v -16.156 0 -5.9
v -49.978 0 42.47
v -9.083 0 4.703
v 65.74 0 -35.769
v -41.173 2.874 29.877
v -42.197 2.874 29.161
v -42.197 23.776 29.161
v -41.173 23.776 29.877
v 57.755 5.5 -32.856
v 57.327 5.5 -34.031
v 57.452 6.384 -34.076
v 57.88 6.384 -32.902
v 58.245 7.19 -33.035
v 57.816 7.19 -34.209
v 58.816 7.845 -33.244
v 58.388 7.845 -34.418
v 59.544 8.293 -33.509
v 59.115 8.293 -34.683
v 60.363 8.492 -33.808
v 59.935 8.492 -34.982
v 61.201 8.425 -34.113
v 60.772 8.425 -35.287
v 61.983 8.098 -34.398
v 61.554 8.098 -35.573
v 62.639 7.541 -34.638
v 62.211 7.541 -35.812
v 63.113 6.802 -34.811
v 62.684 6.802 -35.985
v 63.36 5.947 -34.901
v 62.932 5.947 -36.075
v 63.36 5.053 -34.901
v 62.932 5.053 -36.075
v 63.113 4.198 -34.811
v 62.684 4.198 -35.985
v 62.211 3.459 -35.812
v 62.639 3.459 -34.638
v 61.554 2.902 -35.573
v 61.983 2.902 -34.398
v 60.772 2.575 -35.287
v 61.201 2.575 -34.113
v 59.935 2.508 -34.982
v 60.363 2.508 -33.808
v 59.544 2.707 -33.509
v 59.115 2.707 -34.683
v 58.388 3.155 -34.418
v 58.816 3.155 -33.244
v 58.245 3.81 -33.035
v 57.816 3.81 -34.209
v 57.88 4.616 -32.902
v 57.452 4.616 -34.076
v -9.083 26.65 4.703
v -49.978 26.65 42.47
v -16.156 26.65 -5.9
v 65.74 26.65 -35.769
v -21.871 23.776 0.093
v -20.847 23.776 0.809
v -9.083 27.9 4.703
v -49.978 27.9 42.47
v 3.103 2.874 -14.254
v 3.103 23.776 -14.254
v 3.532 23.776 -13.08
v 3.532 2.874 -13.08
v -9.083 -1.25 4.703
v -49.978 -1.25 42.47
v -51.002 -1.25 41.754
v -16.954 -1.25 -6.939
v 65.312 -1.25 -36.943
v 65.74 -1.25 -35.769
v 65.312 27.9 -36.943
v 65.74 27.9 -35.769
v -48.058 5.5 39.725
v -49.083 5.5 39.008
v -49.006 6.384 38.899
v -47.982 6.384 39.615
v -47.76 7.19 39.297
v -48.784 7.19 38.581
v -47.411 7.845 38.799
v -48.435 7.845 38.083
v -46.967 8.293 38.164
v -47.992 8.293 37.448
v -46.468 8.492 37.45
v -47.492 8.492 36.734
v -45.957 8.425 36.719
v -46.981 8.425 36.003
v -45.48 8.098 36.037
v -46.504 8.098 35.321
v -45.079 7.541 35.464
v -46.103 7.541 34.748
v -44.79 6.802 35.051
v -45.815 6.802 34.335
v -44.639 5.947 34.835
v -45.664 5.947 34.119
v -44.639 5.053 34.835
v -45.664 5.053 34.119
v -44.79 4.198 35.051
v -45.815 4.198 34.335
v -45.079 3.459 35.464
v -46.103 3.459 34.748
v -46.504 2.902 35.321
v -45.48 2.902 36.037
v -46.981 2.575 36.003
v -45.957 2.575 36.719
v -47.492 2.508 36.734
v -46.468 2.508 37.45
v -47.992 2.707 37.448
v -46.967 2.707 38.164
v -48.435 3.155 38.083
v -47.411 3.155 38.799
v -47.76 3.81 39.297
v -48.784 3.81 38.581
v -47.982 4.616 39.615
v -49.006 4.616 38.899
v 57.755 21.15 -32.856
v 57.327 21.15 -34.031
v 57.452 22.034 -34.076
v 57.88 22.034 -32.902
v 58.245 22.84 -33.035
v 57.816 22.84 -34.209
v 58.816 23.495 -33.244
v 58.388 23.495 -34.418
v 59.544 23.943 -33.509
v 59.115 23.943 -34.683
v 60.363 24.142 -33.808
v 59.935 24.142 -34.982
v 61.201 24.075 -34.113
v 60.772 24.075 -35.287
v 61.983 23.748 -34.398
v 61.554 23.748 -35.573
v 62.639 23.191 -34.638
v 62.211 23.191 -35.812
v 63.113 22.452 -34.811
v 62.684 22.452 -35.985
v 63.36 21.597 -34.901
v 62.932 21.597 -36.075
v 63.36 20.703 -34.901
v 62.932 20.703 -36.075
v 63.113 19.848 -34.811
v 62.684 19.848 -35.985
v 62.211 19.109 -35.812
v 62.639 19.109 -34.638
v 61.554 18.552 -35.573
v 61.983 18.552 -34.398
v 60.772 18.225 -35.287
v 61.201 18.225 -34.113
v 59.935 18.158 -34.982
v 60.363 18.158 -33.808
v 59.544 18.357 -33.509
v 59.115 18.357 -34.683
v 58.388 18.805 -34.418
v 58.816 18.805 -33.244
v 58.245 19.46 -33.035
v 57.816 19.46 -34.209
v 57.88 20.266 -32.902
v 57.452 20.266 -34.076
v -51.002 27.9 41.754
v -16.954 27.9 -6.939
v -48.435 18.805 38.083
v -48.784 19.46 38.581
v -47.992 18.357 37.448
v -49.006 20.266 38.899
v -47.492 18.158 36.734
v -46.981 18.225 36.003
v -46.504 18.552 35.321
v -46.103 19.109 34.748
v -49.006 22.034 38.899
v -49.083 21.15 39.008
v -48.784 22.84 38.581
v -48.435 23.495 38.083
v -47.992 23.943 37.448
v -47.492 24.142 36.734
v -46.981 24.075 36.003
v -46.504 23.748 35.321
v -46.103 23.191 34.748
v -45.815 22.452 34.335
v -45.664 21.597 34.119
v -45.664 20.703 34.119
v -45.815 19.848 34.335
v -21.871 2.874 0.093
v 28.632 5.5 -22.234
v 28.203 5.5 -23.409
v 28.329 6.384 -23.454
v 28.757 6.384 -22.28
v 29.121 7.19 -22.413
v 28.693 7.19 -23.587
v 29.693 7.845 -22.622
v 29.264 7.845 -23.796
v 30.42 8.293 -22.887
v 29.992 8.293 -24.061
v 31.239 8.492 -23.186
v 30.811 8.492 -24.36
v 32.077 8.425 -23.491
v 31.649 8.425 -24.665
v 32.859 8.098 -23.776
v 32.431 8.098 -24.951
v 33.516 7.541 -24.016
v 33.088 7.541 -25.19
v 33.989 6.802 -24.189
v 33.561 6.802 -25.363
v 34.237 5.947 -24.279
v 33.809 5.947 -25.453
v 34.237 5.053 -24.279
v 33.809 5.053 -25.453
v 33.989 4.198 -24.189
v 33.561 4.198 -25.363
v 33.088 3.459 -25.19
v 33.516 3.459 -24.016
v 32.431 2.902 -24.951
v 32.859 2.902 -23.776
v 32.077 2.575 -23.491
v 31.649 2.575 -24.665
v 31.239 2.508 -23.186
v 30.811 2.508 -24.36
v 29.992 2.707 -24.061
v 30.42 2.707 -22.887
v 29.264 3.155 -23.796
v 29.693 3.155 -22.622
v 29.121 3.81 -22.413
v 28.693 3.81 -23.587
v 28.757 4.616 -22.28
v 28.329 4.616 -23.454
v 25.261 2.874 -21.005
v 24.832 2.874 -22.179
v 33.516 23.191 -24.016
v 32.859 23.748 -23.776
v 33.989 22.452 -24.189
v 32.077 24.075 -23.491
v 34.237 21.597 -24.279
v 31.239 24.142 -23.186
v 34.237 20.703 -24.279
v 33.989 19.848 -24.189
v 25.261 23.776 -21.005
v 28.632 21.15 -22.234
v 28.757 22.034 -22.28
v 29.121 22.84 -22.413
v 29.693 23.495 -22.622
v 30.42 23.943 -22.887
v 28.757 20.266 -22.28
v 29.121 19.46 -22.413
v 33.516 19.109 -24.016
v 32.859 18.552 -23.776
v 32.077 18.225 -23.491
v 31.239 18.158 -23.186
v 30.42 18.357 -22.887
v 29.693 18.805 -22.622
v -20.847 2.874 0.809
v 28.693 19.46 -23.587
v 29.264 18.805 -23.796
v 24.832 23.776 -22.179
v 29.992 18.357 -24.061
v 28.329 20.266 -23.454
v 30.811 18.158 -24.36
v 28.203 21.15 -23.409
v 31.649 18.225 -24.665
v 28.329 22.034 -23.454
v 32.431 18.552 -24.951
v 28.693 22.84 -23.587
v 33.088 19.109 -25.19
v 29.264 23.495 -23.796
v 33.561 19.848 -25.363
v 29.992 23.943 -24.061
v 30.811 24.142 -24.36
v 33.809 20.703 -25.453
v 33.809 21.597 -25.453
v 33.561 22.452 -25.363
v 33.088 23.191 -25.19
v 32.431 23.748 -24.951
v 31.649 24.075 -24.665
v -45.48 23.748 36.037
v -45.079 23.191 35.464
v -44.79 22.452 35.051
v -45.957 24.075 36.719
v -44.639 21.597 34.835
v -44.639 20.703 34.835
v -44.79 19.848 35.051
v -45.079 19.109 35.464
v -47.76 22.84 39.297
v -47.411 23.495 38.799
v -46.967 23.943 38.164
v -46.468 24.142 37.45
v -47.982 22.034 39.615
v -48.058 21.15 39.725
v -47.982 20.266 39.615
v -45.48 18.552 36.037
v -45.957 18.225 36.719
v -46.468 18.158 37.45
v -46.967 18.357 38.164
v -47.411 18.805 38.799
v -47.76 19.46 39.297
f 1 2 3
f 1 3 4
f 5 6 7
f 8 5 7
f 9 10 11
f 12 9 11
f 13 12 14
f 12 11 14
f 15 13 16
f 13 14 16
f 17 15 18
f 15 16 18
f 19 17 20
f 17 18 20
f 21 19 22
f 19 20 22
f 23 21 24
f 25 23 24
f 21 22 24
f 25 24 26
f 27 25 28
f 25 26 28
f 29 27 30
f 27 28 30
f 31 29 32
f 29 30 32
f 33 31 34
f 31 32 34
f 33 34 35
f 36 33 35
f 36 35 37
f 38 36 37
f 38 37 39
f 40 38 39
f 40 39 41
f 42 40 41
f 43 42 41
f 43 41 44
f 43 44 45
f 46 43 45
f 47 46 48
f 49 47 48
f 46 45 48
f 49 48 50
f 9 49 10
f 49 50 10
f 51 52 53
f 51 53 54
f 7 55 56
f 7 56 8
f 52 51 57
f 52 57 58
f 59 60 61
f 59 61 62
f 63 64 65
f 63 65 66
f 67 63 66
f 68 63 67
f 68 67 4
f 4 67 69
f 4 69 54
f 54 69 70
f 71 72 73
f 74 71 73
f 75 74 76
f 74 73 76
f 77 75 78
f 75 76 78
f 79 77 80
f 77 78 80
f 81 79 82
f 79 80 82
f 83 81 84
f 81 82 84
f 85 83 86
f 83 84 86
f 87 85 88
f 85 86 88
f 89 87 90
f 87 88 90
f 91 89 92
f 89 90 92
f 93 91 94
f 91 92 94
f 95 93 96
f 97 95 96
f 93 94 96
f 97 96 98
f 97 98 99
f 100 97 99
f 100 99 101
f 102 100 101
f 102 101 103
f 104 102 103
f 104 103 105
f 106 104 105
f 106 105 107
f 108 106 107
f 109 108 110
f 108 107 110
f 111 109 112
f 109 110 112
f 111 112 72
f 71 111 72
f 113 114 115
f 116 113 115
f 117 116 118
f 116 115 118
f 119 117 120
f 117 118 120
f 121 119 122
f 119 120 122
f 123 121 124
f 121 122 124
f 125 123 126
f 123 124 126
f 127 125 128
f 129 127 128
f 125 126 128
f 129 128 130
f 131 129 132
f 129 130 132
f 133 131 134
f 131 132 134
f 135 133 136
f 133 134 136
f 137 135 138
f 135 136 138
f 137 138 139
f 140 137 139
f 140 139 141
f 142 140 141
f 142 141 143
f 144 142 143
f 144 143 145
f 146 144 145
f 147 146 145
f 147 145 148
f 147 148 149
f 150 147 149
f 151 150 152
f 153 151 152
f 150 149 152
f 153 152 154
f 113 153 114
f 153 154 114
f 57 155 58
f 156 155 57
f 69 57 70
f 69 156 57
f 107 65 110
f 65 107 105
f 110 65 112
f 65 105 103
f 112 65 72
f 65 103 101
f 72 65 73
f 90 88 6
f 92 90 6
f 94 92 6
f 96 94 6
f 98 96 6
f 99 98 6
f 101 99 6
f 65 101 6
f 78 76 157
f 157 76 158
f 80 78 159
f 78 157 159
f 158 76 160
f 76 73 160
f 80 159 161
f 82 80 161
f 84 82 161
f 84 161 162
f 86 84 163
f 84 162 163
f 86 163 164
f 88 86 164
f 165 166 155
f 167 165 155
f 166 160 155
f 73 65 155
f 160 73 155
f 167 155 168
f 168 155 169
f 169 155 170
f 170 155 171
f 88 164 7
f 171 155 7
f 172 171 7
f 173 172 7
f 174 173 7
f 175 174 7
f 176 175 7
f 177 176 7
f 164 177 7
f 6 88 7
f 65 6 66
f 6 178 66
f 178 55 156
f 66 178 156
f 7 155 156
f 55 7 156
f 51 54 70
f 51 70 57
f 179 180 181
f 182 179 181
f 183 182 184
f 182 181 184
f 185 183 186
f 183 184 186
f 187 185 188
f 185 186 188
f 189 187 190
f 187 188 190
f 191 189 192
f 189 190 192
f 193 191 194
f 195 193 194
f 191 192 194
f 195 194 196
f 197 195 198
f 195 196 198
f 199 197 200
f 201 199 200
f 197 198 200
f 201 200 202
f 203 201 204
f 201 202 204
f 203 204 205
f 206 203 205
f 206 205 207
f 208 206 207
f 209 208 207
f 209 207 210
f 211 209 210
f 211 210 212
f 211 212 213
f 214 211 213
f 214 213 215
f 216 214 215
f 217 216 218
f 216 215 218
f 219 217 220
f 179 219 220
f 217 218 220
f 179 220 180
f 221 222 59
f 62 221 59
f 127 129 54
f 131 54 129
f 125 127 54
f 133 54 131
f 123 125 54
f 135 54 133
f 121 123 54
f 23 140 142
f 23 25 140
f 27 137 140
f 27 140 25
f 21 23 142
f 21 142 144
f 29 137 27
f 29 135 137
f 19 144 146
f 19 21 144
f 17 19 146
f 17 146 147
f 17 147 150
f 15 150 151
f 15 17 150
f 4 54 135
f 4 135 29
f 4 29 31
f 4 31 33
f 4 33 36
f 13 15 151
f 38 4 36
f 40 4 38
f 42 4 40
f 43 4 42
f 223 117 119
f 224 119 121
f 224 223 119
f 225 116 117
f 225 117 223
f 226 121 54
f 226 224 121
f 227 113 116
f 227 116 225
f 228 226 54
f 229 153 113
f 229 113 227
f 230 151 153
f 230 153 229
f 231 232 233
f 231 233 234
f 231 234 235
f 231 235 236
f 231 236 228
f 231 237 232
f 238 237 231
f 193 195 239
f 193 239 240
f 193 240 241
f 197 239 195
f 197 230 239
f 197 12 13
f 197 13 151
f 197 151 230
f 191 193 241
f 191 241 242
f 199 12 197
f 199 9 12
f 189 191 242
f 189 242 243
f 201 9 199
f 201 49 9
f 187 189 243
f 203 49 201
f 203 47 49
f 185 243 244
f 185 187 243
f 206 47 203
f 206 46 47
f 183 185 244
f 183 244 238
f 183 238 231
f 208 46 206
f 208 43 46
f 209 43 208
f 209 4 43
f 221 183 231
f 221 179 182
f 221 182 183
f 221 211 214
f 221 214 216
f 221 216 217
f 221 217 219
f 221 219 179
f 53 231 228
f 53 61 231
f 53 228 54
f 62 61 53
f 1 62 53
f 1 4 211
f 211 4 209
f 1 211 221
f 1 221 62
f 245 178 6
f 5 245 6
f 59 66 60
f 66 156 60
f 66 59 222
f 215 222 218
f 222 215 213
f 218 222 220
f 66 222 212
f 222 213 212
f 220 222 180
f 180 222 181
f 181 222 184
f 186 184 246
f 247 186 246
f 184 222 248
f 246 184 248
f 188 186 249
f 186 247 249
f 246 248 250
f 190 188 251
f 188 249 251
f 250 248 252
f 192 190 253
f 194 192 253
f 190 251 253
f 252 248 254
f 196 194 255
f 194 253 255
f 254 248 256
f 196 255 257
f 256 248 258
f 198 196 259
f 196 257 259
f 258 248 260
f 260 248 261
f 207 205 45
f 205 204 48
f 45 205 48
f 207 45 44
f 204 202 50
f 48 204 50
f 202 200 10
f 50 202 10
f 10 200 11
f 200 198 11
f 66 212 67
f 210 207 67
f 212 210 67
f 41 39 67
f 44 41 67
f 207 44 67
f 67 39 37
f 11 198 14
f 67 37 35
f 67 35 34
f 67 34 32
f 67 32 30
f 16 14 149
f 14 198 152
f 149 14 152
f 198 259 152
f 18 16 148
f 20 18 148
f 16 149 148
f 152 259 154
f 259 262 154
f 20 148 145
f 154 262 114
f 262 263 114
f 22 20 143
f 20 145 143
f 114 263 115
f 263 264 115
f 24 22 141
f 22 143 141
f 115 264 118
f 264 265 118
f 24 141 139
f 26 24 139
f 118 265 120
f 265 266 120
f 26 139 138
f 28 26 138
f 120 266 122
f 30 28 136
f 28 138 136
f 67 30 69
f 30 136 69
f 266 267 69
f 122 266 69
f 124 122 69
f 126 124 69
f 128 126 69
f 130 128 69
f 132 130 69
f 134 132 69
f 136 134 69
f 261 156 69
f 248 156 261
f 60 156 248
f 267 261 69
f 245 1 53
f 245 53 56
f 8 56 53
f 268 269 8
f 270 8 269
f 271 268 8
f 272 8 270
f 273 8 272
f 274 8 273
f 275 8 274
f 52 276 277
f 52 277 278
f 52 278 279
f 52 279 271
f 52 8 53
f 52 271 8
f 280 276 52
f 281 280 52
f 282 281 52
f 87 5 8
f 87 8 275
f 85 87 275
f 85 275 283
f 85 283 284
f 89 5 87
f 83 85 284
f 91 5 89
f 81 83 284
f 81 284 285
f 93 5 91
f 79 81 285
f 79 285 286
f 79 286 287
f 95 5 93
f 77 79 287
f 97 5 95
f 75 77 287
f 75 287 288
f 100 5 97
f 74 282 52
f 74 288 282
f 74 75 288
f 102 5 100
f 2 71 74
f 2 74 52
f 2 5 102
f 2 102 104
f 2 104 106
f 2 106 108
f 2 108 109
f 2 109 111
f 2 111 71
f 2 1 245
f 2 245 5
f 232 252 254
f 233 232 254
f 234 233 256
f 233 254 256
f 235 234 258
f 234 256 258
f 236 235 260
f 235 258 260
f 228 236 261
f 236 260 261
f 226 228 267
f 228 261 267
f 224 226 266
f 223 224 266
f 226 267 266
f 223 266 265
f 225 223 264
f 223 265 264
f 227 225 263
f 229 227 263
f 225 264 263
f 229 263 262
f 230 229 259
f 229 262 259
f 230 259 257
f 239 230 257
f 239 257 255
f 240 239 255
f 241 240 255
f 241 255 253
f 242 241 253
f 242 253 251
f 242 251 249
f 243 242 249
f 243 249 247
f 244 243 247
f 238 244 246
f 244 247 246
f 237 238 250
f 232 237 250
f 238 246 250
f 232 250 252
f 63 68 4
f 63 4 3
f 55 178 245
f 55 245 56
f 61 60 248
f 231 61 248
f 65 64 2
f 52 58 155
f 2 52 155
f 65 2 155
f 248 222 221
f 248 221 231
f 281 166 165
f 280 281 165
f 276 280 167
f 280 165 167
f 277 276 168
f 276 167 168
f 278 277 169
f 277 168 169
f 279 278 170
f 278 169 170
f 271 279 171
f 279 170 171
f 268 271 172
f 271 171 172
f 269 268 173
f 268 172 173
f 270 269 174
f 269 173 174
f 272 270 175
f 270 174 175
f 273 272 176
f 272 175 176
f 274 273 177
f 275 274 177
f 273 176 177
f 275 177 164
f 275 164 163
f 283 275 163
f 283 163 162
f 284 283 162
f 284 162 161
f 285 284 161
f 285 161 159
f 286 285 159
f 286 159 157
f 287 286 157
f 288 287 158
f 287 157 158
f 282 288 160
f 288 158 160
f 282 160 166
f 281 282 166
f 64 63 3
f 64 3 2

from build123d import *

# Parameters (mm, degrees)
BOSS_EXTRUDE1_DEPTH = 26.65
BOSS_EXTRUDE2_DEPTH = 1.25
BOSS_EXTRUDE3_DEPTH = 1.25
SKETCH4_R           = 3
CUT_EXTRUDE1_DEPTH  = 1.25
SKETCH5_R           = 3
CUT_EXTRUDE2_DEPTH  = 1.25
SKETCH6_W           = 35.469315919
SKETCH6_H           = 20.901561166
CUT_EXTRUDE3_DEPTH  = 1.25
CUT_EXTRUDE4_DEPTH  = 1.25
CUT_EXTRUDE5_DEPTH  = 41.25


with BuildPart() as part:
    # Sketch1 → Boss-Extrude1 (new body)
    with BuildSketch(Plane(origin=(0, 0, 0), x_dir=(1, 0, 0), z_dir=(0, 1, 0))):
        Polygon((65.740483752, 35.768961664), (-16.155551111, 5.899521732), (-49.97807415, -42.47004645), (-51.002473848, -41.753732791), (-16.954107408, 6.938813892), (65.312177163, 36.943292736), align=None)
    extrude(amount=BOSS_EXTRUDE1_DEPTH)

    # Sketch2 → Boss-Extrude2 (add)
    with BuildSketch(Plane(origin=(0, 26.65, 0), x_dir=(1, 0, 0), z_dir=(0, 1, 0))):
        Polygon((-51.002473848, -41.753732791), (-49.97807415, -42.47004645), (-7.877469848, -6.485888625), (65.740483752, 35.768961664), (65.312177163, 36.943292736), (-16.954107408, 6.938813892), align=None)
    extrude(amount=BOSS_EXTRUDE2_DEPTH)

    # Sketch3 → Boss-Extrude3 (add)
    with BuildSketch(Plane.XZ):
        Polygon((65.312177163, -36.943292736), (65.740483752, -35.768961664), (-7.877469848, 6.485888625), (-49.97807415, 42.47004645), (-51.002473848, 41.753732791), (-16.954107408, -6.938813892), align=None)
    extrude(amount=BOSS_EXTRUDE3_DEPTH)

    # Sketch4 → Cut-Extrude1 (cut)
    with BuildSketch(Plane(origin=(-4.224136578, 0, -11.581738298), x_dir=(-0.9394648571224508, 0, 0.34264527171973835), z_dir=(-0.34264527171973835, 0, -0.9394648571224508))):
        with Locations((-68.516939764, 21.15)):
            Circle(SKETCH4_R)
        with Locations((-37.516939764, 21.15)):
            Circle(SKETCH4_R)
        with Locations((-37.516939764, 5.5)):
            Circle(SKETCH4_R)
        with Locations((-68.516939764, 5.5)):
            Circle(SKETCH4_R)
    extrude(amount=-CUT_EXTRUDE1_DEPTH, mode=Mode.SUBTRACT)

    # Sketch5 → Cut-Extrude2 (cut)
    with BuildSketch(Plane(origin=(-14.645244024, 0, -10.240717915), x_dir=(-0.5730509275214783, 0, 0.819519758435862), z_dir=(-0.819519758435862, 0, -0.5730509275214783))):
        with Locations((57.095023955, 21.15)):
            Circle(SKETCH5_R)
        with Locations((57.095023955, 5.5)):
            Circle(SKETCH5_R)
    extrude(amount=-CUT_EXTRUDE2_DEPTH, mode=Mode.SUBTRACT)

    # Sketch6 → Cut-Extrude3 (cut)
    with BuildSketch(Plane(origin=(-14.645244024, 0, -10.240717915), x_dir=(-0.5730509275214783, 0, 0.819519758435862), z_dir=(-0.819519758435862, 0, -0.5730509275214783))):
        with Locations((30.344239524, 13.325)):
            Rectangle(SKETCH6_W, SKETCH6_H)
    extrude(amount=-CUT_EXTRUDE3_DEPTH, mode=Mode.SUBTRACT)

    # Sketch7 → Cut-Extrude4 (cut)
    with BuildSketch(Plane(origin=(-4.224136578, 0, -11.581738298), x_dir=(-0.9394648571224508, 0, 0.34264527171973835), z_dir=(-0.34264527171973835, 0, -0.9394648571224508))):
        Polygon((-13.799604913, 23.775780583), (-7.799604913, 23.775780583), (-7.799604913, 2.874219417), (-13.799604913, 2.874219417), (-30.928783923, 2.874219417), (-30.928783923, 23.775780583), align=None)
    extrude(amount=-CUT_EXTRUDE4_DEPTH, mode=Mode.SUBTRACT)

    # Sketch8 → Cut-Extrude5 (cut)
    with BuildSketch(Plane.XZ.offset(1.25)):
        Polygon((65.740483752, -35.768961664), (-9.082823105, 4.70312394), (-49.97807415, 42.47004645), (-7.877469848, 6.485888625), align=None)
    extrude(amount=-CUT_EXTRUDE5_DEPTH, mode=Mode.SUBTRACT)


solid = part.part
